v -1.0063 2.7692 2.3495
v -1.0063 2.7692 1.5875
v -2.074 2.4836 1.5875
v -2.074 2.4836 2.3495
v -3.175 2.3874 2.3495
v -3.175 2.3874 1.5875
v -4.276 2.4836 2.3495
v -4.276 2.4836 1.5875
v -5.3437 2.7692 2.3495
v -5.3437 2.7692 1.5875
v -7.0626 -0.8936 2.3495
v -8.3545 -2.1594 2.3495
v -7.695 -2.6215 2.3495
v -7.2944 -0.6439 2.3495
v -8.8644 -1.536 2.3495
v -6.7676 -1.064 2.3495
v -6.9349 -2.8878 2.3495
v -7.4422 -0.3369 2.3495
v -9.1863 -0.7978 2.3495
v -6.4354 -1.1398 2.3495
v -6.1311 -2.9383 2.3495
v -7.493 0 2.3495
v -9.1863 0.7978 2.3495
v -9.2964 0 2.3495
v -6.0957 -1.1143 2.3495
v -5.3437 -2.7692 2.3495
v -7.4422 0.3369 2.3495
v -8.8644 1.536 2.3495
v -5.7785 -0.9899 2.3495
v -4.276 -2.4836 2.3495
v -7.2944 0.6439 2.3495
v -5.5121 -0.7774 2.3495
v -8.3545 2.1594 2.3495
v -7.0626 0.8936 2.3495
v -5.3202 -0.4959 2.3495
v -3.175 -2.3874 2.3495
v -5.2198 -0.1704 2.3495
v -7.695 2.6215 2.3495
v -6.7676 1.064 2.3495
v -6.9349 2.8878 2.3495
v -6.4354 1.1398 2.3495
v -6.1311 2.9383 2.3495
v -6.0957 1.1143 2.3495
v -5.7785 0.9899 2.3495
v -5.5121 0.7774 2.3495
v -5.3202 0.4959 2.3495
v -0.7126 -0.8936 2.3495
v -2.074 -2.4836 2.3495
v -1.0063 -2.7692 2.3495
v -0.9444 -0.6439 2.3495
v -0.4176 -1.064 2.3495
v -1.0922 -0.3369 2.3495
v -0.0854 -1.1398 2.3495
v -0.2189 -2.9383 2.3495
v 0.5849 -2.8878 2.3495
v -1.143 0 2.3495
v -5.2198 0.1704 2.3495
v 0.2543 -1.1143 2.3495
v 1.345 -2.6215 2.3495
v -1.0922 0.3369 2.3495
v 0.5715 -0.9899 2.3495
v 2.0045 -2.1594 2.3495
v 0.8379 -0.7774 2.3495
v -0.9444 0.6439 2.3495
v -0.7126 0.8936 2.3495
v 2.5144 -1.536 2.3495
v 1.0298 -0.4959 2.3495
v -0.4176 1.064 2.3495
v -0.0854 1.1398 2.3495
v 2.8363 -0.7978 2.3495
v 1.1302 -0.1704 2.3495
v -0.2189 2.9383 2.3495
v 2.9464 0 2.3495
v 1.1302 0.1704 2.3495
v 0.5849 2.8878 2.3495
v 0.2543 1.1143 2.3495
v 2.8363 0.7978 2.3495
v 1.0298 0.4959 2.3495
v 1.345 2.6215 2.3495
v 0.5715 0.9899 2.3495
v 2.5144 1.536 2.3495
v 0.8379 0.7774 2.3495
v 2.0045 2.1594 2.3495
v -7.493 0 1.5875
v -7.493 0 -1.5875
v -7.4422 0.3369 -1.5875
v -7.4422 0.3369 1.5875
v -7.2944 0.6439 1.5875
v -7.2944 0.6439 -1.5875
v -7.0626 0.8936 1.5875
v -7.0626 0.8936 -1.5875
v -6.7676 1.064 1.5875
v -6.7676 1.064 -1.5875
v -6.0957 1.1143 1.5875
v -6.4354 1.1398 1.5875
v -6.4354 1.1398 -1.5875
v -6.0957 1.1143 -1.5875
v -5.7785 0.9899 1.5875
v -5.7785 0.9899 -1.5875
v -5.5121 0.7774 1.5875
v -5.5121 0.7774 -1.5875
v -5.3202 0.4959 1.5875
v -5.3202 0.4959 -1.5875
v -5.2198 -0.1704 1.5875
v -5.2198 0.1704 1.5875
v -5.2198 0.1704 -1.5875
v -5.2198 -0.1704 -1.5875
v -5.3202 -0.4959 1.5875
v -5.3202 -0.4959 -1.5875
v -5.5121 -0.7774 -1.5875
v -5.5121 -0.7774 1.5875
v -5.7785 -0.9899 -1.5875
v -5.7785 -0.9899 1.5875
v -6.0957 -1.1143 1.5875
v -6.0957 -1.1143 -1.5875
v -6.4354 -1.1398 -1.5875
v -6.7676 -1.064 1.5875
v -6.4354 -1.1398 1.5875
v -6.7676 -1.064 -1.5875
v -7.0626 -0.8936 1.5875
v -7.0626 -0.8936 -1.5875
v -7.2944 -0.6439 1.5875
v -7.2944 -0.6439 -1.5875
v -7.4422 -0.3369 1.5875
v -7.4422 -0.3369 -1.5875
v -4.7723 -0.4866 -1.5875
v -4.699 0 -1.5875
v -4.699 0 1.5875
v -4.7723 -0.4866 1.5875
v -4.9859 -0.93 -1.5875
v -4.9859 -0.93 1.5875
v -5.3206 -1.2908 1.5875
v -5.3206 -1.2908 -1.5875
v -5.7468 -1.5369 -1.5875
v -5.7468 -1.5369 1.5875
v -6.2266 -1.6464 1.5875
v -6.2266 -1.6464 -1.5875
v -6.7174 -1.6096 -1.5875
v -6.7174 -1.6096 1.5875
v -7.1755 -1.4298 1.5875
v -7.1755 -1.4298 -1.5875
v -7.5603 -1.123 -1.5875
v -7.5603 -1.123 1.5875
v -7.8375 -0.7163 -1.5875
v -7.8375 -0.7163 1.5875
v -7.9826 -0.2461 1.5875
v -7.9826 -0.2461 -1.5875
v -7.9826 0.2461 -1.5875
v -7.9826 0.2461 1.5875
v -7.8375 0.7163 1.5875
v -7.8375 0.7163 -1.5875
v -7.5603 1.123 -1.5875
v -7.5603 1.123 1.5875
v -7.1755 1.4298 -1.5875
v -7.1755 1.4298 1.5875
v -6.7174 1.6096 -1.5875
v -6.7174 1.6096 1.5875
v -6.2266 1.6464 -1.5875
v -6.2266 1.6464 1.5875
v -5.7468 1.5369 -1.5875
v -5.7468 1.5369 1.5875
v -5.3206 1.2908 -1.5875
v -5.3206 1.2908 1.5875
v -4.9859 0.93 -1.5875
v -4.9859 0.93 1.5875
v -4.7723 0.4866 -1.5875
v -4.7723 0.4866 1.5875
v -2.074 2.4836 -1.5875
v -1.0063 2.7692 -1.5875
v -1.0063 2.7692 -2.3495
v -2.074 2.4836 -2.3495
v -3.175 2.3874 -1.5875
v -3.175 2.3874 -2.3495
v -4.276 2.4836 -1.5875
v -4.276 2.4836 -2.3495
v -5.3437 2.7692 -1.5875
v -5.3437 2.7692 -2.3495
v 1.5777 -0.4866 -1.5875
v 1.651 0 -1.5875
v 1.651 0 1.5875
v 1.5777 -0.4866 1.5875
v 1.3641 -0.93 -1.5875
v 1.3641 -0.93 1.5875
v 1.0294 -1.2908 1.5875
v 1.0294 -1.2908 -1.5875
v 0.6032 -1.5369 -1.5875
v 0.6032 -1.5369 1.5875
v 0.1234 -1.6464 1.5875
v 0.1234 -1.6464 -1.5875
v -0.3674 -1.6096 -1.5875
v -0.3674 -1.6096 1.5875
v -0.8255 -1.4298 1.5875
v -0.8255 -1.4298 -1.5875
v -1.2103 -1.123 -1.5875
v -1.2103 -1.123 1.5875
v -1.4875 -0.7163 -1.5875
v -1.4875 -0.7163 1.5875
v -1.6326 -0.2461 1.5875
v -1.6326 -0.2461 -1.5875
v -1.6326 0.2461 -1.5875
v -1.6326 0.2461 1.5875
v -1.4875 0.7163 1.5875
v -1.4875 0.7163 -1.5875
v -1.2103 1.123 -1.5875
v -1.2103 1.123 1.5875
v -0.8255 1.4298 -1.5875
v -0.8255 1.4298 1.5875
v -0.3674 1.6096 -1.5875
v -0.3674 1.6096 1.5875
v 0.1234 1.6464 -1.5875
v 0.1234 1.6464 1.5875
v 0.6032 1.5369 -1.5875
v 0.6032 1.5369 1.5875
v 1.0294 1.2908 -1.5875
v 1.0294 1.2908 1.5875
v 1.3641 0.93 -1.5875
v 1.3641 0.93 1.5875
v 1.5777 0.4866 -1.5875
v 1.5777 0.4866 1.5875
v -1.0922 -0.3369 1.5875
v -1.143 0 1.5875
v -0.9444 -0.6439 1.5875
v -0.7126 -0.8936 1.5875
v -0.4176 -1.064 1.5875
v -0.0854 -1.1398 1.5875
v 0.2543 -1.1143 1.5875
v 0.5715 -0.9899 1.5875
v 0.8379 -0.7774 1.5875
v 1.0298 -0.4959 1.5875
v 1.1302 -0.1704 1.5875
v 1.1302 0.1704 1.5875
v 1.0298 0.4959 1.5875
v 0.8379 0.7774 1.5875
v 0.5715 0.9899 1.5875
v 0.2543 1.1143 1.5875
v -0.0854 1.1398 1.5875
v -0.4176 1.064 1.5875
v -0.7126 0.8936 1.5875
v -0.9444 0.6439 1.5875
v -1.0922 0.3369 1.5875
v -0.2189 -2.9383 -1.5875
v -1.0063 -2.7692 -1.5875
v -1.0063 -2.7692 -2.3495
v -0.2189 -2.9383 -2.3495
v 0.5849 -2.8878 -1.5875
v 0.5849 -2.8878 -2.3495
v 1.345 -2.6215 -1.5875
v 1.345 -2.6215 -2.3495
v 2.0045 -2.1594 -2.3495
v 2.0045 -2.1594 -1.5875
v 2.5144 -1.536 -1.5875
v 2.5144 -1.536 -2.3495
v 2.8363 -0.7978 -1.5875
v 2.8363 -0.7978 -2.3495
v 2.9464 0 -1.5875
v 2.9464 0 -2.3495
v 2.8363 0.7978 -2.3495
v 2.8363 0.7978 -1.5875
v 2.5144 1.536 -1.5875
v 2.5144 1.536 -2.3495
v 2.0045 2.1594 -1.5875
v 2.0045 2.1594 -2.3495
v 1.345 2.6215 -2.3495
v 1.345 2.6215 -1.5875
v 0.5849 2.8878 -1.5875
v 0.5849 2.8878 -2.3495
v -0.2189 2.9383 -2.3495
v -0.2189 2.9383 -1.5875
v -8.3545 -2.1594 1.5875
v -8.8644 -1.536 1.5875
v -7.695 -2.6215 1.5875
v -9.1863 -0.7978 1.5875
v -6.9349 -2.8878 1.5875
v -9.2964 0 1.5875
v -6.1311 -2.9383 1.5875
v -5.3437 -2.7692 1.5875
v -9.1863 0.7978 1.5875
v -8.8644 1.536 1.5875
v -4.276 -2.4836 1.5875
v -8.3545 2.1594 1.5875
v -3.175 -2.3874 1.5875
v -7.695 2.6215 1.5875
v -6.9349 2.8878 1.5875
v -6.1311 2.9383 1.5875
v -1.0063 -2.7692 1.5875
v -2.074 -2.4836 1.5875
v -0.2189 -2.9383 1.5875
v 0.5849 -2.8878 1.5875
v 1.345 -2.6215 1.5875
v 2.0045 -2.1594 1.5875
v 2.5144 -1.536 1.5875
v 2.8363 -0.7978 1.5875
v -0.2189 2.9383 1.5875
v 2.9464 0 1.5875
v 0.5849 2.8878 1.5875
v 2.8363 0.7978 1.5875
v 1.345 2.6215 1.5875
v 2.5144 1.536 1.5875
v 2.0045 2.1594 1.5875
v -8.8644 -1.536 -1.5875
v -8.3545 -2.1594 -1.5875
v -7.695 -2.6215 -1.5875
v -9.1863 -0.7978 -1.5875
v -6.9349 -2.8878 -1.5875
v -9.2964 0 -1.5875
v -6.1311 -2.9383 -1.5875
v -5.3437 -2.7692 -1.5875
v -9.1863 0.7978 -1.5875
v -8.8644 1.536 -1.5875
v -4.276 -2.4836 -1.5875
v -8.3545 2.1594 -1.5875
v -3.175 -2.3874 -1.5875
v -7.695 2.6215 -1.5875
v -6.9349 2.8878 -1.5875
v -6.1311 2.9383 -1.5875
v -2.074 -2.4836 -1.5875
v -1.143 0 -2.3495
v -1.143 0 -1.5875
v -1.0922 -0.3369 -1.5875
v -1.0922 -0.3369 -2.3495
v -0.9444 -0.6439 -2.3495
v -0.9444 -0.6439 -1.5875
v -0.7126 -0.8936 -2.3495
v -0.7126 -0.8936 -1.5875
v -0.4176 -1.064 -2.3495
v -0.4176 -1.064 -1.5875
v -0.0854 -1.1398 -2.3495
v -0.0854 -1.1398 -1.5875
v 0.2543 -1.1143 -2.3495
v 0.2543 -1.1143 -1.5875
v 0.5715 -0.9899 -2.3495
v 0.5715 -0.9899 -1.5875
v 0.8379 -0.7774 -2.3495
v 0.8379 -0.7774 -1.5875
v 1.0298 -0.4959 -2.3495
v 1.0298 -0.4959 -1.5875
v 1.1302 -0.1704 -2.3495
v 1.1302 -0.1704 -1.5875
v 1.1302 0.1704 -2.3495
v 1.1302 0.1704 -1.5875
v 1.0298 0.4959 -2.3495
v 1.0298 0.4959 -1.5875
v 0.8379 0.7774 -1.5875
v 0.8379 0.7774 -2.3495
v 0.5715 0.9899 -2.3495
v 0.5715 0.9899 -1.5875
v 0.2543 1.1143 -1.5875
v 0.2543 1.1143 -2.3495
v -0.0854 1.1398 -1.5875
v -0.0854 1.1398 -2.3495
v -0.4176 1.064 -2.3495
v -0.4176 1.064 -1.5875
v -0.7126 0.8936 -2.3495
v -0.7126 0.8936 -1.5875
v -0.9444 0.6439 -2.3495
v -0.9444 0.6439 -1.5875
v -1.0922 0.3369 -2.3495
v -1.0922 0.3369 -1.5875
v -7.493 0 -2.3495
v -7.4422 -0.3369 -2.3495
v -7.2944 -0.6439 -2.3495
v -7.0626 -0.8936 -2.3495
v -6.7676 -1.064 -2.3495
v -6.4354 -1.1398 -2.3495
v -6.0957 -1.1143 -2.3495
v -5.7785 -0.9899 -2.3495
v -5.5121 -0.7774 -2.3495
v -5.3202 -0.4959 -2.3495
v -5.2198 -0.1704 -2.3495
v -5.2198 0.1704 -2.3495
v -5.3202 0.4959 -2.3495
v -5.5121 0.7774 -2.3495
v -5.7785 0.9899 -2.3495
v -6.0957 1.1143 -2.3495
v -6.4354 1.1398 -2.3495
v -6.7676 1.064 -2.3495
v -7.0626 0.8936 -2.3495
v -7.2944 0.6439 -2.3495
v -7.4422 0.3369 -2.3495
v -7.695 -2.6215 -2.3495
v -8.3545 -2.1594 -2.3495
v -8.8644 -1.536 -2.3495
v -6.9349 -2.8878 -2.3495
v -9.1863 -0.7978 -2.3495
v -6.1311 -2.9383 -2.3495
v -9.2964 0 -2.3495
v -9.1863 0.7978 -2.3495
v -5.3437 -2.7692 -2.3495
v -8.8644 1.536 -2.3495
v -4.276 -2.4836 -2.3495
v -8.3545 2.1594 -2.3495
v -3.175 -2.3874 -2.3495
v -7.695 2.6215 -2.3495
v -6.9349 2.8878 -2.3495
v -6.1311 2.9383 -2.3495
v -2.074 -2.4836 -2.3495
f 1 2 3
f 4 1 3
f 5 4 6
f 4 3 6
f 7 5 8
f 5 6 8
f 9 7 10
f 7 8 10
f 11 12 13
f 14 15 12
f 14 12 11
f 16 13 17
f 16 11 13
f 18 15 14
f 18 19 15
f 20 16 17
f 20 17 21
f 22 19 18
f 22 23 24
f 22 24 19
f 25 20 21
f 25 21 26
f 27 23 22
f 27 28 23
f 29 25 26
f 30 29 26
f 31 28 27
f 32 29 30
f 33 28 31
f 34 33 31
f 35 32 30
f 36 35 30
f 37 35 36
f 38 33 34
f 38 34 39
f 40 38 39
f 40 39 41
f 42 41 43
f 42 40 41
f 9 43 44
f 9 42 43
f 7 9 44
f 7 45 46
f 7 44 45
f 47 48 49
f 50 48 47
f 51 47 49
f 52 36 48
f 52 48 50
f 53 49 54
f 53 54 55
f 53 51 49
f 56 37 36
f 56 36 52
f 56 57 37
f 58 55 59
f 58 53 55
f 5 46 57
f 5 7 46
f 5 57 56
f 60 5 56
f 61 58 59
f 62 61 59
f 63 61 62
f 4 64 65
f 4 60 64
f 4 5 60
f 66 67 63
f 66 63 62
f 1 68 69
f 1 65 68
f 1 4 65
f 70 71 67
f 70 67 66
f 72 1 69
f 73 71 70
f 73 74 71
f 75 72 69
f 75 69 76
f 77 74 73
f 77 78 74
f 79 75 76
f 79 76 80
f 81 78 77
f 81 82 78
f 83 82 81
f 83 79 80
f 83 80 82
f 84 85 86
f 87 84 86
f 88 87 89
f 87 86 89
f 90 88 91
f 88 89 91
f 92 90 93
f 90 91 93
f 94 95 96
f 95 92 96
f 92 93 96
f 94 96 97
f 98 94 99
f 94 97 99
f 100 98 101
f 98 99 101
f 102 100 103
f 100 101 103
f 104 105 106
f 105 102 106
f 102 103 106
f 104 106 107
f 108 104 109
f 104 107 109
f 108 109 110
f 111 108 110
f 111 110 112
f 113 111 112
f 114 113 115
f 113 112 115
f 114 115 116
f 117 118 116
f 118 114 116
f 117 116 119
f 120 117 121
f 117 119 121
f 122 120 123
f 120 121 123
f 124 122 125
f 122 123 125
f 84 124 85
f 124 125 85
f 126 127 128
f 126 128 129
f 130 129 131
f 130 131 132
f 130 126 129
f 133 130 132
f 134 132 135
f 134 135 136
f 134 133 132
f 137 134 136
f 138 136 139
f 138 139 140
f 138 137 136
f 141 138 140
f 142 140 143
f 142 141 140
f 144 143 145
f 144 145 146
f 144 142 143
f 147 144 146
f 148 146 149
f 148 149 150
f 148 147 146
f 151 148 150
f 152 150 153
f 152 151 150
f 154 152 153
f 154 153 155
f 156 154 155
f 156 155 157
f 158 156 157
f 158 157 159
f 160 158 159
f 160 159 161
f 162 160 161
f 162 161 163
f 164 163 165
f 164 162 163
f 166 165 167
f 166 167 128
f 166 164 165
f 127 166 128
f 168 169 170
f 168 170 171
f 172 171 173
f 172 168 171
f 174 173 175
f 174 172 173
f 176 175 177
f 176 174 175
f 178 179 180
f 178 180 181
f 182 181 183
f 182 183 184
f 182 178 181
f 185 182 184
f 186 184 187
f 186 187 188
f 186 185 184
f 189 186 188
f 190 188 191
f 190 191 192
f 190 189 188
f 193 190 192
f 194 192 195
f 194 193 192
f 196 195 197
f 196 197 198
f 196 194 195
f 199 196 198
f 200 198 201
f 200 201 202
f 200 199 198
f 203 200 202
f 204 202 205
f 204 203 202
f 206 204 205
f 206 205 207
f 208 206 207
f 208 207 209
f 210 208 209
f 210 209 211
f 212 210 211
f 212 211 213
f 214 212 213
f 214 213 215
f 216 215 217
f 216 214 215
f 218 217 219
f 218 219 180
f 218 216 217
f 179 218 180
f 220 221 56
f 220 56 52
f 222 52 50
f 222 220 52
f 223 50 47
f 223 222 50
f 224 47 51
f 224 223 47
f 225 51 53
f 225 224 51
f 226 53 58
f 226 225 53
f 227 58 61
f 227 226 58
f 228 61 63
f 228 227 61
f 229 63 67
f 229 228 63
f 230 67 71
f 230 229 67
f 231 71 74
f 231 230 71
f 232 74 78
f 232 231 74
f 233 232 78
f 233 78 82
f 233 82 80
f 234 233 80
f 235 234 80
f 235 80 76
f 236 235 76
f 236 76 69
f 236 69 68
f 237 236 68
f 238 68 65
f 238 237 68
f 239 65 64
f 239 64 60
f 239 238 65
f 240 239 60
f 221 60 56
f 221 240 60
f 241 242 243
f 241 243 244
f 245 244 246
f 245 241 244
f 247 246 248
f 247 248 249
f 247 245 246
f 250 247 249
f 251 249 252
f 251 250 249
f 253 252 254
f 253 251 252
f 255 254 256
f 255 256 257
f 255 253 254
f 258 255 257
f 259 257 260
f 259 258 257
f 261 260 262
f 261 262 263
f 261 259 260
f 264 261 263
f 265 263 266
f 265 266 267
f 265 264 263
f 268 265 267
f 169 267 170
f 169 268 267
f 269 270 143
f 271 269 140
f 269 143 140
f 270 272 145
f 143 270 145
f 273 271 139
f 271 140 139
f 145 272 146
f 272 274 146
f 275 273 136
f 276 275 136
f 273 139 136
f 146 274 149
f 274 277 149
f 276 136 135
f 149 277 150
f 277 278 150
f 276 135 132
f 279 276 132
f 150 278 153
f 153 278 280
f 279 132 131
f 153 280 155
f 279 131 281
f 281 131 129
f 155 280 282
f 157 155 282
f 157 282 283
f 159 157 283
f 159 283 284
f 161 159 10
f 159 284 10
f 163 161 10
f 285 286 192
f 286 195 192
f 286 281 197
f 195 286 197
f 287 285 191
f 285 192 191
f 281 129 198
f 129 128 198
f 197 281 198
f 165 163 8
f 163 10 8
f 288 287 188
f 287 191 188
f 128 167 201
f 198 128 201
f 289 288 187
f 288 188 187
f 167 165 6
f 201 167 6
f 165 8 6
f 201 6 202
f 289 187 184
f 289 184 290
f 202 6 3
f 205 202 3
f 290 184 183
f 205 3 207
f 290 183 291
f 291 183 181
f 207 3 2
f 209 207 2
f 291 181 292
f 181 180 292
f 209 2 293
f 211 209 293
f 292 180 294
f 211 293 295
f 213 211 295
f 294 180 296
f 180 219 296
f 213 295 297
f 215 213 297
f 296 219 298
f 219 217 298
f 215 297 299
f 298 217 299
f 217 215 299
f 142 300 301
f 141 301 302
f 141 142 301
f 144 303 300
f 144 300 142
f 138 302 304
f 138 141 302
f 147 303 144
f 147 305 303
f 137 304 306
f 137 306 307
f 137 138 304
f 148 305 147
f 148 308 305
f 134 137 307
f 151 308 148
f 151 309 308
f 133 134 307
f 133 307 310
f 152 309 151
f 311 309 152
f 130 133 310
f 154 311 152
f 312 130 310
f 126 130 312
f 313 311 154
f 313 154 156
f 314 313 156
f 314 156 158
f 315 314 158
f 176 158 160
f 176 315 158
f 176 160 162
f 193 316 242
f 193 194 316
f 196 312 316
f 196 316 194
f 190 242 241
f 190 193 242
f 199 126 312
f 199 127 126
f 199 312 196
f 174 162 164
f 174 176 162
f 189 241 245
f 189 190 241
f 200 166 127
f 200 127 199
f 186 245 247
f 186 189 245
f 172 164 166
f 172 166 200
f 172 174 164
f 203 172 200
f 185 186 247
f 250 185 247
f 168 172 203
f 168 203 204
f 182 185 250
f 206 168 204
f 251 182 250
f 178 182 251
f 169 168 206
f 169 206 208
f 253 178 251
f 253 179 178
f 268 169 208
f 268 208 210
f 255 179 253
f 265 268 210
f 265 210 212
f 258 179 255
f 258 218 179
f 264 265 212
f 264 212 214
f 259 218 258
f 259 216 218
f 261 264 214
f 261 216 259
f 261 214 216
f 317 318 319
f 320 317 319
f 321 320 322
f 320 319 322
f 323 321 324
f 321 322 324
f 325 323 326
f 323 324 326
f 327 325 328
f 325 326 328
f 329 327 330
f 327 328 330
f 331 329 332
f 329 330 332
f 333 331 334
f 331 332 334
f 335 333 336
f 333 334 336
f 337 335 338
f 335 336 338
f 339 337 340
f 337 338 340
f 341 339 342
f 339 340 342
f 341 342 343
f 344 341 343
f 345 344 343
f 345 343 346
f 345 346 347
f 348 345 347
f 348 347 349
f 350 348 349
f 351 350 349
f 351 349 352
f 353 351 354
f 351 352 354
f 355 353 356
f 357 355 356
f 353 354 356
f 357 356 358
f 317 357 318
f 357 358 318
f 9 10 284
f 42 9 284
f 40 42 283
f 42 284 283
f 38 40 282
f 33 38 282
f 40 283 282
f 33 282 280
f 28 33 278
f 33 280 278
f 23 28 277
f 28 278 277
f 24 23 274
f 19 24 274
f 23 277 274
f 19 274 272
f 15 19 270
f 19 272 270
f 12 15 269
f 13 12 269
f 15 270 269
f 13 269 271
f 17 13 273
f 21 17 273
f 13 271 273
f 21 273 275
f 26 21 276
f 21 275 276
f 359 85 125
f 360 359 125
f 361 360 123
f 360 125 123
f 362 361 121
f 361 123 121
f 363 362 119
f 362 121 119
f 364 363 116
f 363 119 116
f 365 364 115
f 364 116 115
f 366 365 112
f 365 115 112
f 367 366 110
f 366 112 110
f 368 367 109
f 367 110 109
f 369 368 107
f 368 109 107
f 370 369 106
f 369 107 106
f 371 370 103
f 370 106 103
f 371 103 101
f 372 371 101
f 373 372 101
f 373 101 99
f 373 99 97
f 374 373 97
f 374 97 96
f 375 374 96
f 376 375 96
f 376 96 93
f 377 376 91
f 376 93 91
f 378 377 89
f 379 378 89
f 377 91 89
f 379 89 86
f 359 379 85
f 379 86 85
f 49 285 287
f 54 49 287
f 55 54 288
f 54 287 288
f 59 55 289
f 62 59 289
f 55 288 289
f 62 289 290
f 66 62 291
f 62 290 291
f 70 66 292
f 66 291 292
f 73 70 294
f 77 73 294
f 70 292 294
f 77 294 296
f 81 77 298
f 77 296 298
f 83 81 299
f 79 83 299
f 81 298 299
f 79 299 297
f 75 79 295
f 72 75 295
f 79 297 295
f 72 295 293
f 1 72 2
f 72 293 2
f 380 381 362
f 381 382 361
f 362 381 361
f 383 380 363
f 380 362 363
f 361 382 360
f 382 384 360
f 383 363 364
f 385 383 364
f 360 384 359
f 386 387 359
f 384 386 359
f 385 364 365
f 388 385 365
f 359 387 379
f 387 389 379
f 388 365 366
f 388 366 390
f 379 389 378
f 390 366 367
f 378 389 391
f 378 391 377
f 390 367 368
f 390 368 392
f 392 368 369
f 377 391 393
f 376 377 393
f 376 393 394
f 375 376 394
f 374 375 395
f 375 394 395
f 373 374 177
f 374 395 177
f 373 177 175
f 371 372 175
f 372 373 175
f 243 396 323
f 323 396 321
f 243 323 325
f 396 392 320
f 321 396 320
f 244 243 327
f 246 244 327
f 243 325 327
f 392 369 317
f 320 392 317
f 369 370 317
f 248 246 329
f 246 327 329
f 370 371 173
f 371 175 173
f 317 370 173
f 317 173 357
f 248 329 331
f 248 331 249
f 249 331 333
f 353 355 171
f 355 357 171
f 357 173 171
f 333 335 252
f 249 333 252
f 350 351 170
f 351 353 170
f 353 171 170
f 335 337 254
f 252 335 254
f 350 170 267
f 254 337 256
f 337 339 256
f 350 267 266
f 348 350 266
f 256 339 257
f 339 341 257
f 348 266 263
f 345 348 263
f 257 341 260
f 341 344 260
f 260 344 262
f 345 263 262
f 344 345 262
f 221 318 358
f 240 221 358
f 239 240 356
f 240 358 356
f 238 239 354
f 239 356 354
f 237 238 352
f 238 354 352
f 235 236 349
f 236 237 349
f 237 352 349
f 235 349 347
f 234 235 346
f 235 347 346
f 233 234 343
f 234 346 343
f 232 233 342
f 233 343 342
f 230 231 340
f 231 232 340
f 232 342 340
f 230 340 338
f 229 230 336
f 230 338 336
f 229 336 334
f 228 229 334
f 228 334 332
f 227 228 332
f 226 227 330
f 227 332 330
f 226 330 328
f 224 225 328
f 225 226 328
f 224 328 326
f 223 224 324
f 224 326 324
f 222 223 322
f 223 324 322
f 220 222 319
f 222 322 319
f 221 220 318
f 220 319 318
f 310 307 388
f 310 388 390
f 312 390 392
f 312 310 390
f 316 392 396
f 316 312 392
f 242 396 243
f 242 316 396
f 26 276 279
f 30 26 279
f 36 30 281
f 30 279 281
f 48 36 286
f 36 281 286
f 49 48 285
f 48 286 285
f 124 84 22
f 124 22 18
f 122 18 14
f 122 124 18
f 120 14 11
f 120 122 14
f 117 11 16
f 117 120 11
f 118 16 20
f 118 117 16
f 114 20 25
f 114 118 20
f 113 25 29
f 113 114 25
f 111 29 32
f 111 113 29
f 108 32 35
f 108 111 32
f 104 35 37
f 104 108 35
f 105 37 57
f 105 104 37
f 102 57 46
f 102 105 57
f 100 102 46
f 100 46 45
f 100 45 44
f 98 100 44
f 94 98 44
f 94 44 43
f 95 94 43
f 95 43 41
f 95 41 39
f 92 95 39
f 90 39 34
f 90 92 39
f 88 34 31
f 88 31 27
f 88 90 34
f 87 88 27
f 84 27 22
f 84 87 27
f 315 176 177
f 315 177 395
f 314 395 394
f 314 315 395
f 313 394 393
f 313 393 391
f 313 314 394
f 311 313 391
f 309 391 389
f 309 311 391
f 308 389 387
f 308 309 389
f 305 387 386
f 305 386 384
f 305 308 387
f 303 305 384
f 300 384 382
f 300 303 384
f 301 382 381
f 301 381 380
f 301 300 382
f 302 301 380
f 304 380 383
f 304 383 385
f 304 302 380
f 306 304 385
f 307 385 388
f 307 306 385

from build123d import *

# Parameters (mm, degrees)
INNER_START         = 1.5875
SKETCH1_R           = 1.143
INNER_LINK_S1_DEPTH = 0.762
TUBES_START         = 3.175
SKETCH3_R           = 1.651
SKETCH3_R_2         = 1.143
TUBES_DEPTH         = 3.175


with BuildPart() as part:
    # Sketch1 → inner link s1 (new body)
    with BuildSketch(Plane.XY.offset(INNER_START)):
        with BuildLine():
            ThreePointArc((-1.006284153, -2.769235484), (2.9464, 0), (-1.006284153, 2.769235484))
            ThreePointArc((-1.006284153, 2.769235484), (-3.175, 2.387415405), (-5.343715847, 2.769235484))
            ThreePointArc((-5.343715847, 2.769235484), (-9.2964, 0), (-5.343715847, -2.769235484))
            ThreePointArc((-5.343715847, -2.769235484), (-3.175, -2.387415405), (-1.006284153, -2.769235484))
        make_face()
        with Locations(Location((0, 0, 0), (0, 0, 180))):
            Circle(SKETCH1_R, mode=Mode.SUBTRACT)
        with Locations(Location((-6.35, 0, 0), (0, 0, 180))):
            Circle(SKETCH1_R, mode=Mode.SUBTRACT)
    extrude(amount=INNER_LINK_S1_DEPTH)


with BuildPart() as body_2:
    # inner link s2: mirrored copy
    add(part.part.mirror(Plane.XY))


with BuildPart() as part_1:
    add(part.part)

    add(body_2.part)  # tubes merges body 2
    # Sketch3 → tubes (add)
    # profile 1 of 2: a face of its own
    with BuildSketch(Plane(origin=(0, 0, 1.5875), x_dir=(-1, 0, 0), z_dir=(0, 0, -1)).offset(TUBES_START)):
        with Locations(Location((0, 0, 0), (0, 0, 180))):
            Circle(SKETCH3_R)
        Circle(SKETCH3_R_2, mode=Mode.SUBTRACT)
    # profile 2 of 2: a face of its own
    with BuildSketch(Plane(origin=(0, 0, 1.5875), x_dir=(-1, 0, 0), z_dir=(0, 0, -1)).offset(TUBES_START)):
        with Locations(Location((6.35, 0, 0), (0, 0, 180))):
            Circle(SKETCH3_R)
        with Locations((6.35, 0)):
            Circle(SKETCH3_R_2, mode=Mode.SUBTRACT)
    extrude(amount=-TUBES_DEPTH)


solid = part_1.part
